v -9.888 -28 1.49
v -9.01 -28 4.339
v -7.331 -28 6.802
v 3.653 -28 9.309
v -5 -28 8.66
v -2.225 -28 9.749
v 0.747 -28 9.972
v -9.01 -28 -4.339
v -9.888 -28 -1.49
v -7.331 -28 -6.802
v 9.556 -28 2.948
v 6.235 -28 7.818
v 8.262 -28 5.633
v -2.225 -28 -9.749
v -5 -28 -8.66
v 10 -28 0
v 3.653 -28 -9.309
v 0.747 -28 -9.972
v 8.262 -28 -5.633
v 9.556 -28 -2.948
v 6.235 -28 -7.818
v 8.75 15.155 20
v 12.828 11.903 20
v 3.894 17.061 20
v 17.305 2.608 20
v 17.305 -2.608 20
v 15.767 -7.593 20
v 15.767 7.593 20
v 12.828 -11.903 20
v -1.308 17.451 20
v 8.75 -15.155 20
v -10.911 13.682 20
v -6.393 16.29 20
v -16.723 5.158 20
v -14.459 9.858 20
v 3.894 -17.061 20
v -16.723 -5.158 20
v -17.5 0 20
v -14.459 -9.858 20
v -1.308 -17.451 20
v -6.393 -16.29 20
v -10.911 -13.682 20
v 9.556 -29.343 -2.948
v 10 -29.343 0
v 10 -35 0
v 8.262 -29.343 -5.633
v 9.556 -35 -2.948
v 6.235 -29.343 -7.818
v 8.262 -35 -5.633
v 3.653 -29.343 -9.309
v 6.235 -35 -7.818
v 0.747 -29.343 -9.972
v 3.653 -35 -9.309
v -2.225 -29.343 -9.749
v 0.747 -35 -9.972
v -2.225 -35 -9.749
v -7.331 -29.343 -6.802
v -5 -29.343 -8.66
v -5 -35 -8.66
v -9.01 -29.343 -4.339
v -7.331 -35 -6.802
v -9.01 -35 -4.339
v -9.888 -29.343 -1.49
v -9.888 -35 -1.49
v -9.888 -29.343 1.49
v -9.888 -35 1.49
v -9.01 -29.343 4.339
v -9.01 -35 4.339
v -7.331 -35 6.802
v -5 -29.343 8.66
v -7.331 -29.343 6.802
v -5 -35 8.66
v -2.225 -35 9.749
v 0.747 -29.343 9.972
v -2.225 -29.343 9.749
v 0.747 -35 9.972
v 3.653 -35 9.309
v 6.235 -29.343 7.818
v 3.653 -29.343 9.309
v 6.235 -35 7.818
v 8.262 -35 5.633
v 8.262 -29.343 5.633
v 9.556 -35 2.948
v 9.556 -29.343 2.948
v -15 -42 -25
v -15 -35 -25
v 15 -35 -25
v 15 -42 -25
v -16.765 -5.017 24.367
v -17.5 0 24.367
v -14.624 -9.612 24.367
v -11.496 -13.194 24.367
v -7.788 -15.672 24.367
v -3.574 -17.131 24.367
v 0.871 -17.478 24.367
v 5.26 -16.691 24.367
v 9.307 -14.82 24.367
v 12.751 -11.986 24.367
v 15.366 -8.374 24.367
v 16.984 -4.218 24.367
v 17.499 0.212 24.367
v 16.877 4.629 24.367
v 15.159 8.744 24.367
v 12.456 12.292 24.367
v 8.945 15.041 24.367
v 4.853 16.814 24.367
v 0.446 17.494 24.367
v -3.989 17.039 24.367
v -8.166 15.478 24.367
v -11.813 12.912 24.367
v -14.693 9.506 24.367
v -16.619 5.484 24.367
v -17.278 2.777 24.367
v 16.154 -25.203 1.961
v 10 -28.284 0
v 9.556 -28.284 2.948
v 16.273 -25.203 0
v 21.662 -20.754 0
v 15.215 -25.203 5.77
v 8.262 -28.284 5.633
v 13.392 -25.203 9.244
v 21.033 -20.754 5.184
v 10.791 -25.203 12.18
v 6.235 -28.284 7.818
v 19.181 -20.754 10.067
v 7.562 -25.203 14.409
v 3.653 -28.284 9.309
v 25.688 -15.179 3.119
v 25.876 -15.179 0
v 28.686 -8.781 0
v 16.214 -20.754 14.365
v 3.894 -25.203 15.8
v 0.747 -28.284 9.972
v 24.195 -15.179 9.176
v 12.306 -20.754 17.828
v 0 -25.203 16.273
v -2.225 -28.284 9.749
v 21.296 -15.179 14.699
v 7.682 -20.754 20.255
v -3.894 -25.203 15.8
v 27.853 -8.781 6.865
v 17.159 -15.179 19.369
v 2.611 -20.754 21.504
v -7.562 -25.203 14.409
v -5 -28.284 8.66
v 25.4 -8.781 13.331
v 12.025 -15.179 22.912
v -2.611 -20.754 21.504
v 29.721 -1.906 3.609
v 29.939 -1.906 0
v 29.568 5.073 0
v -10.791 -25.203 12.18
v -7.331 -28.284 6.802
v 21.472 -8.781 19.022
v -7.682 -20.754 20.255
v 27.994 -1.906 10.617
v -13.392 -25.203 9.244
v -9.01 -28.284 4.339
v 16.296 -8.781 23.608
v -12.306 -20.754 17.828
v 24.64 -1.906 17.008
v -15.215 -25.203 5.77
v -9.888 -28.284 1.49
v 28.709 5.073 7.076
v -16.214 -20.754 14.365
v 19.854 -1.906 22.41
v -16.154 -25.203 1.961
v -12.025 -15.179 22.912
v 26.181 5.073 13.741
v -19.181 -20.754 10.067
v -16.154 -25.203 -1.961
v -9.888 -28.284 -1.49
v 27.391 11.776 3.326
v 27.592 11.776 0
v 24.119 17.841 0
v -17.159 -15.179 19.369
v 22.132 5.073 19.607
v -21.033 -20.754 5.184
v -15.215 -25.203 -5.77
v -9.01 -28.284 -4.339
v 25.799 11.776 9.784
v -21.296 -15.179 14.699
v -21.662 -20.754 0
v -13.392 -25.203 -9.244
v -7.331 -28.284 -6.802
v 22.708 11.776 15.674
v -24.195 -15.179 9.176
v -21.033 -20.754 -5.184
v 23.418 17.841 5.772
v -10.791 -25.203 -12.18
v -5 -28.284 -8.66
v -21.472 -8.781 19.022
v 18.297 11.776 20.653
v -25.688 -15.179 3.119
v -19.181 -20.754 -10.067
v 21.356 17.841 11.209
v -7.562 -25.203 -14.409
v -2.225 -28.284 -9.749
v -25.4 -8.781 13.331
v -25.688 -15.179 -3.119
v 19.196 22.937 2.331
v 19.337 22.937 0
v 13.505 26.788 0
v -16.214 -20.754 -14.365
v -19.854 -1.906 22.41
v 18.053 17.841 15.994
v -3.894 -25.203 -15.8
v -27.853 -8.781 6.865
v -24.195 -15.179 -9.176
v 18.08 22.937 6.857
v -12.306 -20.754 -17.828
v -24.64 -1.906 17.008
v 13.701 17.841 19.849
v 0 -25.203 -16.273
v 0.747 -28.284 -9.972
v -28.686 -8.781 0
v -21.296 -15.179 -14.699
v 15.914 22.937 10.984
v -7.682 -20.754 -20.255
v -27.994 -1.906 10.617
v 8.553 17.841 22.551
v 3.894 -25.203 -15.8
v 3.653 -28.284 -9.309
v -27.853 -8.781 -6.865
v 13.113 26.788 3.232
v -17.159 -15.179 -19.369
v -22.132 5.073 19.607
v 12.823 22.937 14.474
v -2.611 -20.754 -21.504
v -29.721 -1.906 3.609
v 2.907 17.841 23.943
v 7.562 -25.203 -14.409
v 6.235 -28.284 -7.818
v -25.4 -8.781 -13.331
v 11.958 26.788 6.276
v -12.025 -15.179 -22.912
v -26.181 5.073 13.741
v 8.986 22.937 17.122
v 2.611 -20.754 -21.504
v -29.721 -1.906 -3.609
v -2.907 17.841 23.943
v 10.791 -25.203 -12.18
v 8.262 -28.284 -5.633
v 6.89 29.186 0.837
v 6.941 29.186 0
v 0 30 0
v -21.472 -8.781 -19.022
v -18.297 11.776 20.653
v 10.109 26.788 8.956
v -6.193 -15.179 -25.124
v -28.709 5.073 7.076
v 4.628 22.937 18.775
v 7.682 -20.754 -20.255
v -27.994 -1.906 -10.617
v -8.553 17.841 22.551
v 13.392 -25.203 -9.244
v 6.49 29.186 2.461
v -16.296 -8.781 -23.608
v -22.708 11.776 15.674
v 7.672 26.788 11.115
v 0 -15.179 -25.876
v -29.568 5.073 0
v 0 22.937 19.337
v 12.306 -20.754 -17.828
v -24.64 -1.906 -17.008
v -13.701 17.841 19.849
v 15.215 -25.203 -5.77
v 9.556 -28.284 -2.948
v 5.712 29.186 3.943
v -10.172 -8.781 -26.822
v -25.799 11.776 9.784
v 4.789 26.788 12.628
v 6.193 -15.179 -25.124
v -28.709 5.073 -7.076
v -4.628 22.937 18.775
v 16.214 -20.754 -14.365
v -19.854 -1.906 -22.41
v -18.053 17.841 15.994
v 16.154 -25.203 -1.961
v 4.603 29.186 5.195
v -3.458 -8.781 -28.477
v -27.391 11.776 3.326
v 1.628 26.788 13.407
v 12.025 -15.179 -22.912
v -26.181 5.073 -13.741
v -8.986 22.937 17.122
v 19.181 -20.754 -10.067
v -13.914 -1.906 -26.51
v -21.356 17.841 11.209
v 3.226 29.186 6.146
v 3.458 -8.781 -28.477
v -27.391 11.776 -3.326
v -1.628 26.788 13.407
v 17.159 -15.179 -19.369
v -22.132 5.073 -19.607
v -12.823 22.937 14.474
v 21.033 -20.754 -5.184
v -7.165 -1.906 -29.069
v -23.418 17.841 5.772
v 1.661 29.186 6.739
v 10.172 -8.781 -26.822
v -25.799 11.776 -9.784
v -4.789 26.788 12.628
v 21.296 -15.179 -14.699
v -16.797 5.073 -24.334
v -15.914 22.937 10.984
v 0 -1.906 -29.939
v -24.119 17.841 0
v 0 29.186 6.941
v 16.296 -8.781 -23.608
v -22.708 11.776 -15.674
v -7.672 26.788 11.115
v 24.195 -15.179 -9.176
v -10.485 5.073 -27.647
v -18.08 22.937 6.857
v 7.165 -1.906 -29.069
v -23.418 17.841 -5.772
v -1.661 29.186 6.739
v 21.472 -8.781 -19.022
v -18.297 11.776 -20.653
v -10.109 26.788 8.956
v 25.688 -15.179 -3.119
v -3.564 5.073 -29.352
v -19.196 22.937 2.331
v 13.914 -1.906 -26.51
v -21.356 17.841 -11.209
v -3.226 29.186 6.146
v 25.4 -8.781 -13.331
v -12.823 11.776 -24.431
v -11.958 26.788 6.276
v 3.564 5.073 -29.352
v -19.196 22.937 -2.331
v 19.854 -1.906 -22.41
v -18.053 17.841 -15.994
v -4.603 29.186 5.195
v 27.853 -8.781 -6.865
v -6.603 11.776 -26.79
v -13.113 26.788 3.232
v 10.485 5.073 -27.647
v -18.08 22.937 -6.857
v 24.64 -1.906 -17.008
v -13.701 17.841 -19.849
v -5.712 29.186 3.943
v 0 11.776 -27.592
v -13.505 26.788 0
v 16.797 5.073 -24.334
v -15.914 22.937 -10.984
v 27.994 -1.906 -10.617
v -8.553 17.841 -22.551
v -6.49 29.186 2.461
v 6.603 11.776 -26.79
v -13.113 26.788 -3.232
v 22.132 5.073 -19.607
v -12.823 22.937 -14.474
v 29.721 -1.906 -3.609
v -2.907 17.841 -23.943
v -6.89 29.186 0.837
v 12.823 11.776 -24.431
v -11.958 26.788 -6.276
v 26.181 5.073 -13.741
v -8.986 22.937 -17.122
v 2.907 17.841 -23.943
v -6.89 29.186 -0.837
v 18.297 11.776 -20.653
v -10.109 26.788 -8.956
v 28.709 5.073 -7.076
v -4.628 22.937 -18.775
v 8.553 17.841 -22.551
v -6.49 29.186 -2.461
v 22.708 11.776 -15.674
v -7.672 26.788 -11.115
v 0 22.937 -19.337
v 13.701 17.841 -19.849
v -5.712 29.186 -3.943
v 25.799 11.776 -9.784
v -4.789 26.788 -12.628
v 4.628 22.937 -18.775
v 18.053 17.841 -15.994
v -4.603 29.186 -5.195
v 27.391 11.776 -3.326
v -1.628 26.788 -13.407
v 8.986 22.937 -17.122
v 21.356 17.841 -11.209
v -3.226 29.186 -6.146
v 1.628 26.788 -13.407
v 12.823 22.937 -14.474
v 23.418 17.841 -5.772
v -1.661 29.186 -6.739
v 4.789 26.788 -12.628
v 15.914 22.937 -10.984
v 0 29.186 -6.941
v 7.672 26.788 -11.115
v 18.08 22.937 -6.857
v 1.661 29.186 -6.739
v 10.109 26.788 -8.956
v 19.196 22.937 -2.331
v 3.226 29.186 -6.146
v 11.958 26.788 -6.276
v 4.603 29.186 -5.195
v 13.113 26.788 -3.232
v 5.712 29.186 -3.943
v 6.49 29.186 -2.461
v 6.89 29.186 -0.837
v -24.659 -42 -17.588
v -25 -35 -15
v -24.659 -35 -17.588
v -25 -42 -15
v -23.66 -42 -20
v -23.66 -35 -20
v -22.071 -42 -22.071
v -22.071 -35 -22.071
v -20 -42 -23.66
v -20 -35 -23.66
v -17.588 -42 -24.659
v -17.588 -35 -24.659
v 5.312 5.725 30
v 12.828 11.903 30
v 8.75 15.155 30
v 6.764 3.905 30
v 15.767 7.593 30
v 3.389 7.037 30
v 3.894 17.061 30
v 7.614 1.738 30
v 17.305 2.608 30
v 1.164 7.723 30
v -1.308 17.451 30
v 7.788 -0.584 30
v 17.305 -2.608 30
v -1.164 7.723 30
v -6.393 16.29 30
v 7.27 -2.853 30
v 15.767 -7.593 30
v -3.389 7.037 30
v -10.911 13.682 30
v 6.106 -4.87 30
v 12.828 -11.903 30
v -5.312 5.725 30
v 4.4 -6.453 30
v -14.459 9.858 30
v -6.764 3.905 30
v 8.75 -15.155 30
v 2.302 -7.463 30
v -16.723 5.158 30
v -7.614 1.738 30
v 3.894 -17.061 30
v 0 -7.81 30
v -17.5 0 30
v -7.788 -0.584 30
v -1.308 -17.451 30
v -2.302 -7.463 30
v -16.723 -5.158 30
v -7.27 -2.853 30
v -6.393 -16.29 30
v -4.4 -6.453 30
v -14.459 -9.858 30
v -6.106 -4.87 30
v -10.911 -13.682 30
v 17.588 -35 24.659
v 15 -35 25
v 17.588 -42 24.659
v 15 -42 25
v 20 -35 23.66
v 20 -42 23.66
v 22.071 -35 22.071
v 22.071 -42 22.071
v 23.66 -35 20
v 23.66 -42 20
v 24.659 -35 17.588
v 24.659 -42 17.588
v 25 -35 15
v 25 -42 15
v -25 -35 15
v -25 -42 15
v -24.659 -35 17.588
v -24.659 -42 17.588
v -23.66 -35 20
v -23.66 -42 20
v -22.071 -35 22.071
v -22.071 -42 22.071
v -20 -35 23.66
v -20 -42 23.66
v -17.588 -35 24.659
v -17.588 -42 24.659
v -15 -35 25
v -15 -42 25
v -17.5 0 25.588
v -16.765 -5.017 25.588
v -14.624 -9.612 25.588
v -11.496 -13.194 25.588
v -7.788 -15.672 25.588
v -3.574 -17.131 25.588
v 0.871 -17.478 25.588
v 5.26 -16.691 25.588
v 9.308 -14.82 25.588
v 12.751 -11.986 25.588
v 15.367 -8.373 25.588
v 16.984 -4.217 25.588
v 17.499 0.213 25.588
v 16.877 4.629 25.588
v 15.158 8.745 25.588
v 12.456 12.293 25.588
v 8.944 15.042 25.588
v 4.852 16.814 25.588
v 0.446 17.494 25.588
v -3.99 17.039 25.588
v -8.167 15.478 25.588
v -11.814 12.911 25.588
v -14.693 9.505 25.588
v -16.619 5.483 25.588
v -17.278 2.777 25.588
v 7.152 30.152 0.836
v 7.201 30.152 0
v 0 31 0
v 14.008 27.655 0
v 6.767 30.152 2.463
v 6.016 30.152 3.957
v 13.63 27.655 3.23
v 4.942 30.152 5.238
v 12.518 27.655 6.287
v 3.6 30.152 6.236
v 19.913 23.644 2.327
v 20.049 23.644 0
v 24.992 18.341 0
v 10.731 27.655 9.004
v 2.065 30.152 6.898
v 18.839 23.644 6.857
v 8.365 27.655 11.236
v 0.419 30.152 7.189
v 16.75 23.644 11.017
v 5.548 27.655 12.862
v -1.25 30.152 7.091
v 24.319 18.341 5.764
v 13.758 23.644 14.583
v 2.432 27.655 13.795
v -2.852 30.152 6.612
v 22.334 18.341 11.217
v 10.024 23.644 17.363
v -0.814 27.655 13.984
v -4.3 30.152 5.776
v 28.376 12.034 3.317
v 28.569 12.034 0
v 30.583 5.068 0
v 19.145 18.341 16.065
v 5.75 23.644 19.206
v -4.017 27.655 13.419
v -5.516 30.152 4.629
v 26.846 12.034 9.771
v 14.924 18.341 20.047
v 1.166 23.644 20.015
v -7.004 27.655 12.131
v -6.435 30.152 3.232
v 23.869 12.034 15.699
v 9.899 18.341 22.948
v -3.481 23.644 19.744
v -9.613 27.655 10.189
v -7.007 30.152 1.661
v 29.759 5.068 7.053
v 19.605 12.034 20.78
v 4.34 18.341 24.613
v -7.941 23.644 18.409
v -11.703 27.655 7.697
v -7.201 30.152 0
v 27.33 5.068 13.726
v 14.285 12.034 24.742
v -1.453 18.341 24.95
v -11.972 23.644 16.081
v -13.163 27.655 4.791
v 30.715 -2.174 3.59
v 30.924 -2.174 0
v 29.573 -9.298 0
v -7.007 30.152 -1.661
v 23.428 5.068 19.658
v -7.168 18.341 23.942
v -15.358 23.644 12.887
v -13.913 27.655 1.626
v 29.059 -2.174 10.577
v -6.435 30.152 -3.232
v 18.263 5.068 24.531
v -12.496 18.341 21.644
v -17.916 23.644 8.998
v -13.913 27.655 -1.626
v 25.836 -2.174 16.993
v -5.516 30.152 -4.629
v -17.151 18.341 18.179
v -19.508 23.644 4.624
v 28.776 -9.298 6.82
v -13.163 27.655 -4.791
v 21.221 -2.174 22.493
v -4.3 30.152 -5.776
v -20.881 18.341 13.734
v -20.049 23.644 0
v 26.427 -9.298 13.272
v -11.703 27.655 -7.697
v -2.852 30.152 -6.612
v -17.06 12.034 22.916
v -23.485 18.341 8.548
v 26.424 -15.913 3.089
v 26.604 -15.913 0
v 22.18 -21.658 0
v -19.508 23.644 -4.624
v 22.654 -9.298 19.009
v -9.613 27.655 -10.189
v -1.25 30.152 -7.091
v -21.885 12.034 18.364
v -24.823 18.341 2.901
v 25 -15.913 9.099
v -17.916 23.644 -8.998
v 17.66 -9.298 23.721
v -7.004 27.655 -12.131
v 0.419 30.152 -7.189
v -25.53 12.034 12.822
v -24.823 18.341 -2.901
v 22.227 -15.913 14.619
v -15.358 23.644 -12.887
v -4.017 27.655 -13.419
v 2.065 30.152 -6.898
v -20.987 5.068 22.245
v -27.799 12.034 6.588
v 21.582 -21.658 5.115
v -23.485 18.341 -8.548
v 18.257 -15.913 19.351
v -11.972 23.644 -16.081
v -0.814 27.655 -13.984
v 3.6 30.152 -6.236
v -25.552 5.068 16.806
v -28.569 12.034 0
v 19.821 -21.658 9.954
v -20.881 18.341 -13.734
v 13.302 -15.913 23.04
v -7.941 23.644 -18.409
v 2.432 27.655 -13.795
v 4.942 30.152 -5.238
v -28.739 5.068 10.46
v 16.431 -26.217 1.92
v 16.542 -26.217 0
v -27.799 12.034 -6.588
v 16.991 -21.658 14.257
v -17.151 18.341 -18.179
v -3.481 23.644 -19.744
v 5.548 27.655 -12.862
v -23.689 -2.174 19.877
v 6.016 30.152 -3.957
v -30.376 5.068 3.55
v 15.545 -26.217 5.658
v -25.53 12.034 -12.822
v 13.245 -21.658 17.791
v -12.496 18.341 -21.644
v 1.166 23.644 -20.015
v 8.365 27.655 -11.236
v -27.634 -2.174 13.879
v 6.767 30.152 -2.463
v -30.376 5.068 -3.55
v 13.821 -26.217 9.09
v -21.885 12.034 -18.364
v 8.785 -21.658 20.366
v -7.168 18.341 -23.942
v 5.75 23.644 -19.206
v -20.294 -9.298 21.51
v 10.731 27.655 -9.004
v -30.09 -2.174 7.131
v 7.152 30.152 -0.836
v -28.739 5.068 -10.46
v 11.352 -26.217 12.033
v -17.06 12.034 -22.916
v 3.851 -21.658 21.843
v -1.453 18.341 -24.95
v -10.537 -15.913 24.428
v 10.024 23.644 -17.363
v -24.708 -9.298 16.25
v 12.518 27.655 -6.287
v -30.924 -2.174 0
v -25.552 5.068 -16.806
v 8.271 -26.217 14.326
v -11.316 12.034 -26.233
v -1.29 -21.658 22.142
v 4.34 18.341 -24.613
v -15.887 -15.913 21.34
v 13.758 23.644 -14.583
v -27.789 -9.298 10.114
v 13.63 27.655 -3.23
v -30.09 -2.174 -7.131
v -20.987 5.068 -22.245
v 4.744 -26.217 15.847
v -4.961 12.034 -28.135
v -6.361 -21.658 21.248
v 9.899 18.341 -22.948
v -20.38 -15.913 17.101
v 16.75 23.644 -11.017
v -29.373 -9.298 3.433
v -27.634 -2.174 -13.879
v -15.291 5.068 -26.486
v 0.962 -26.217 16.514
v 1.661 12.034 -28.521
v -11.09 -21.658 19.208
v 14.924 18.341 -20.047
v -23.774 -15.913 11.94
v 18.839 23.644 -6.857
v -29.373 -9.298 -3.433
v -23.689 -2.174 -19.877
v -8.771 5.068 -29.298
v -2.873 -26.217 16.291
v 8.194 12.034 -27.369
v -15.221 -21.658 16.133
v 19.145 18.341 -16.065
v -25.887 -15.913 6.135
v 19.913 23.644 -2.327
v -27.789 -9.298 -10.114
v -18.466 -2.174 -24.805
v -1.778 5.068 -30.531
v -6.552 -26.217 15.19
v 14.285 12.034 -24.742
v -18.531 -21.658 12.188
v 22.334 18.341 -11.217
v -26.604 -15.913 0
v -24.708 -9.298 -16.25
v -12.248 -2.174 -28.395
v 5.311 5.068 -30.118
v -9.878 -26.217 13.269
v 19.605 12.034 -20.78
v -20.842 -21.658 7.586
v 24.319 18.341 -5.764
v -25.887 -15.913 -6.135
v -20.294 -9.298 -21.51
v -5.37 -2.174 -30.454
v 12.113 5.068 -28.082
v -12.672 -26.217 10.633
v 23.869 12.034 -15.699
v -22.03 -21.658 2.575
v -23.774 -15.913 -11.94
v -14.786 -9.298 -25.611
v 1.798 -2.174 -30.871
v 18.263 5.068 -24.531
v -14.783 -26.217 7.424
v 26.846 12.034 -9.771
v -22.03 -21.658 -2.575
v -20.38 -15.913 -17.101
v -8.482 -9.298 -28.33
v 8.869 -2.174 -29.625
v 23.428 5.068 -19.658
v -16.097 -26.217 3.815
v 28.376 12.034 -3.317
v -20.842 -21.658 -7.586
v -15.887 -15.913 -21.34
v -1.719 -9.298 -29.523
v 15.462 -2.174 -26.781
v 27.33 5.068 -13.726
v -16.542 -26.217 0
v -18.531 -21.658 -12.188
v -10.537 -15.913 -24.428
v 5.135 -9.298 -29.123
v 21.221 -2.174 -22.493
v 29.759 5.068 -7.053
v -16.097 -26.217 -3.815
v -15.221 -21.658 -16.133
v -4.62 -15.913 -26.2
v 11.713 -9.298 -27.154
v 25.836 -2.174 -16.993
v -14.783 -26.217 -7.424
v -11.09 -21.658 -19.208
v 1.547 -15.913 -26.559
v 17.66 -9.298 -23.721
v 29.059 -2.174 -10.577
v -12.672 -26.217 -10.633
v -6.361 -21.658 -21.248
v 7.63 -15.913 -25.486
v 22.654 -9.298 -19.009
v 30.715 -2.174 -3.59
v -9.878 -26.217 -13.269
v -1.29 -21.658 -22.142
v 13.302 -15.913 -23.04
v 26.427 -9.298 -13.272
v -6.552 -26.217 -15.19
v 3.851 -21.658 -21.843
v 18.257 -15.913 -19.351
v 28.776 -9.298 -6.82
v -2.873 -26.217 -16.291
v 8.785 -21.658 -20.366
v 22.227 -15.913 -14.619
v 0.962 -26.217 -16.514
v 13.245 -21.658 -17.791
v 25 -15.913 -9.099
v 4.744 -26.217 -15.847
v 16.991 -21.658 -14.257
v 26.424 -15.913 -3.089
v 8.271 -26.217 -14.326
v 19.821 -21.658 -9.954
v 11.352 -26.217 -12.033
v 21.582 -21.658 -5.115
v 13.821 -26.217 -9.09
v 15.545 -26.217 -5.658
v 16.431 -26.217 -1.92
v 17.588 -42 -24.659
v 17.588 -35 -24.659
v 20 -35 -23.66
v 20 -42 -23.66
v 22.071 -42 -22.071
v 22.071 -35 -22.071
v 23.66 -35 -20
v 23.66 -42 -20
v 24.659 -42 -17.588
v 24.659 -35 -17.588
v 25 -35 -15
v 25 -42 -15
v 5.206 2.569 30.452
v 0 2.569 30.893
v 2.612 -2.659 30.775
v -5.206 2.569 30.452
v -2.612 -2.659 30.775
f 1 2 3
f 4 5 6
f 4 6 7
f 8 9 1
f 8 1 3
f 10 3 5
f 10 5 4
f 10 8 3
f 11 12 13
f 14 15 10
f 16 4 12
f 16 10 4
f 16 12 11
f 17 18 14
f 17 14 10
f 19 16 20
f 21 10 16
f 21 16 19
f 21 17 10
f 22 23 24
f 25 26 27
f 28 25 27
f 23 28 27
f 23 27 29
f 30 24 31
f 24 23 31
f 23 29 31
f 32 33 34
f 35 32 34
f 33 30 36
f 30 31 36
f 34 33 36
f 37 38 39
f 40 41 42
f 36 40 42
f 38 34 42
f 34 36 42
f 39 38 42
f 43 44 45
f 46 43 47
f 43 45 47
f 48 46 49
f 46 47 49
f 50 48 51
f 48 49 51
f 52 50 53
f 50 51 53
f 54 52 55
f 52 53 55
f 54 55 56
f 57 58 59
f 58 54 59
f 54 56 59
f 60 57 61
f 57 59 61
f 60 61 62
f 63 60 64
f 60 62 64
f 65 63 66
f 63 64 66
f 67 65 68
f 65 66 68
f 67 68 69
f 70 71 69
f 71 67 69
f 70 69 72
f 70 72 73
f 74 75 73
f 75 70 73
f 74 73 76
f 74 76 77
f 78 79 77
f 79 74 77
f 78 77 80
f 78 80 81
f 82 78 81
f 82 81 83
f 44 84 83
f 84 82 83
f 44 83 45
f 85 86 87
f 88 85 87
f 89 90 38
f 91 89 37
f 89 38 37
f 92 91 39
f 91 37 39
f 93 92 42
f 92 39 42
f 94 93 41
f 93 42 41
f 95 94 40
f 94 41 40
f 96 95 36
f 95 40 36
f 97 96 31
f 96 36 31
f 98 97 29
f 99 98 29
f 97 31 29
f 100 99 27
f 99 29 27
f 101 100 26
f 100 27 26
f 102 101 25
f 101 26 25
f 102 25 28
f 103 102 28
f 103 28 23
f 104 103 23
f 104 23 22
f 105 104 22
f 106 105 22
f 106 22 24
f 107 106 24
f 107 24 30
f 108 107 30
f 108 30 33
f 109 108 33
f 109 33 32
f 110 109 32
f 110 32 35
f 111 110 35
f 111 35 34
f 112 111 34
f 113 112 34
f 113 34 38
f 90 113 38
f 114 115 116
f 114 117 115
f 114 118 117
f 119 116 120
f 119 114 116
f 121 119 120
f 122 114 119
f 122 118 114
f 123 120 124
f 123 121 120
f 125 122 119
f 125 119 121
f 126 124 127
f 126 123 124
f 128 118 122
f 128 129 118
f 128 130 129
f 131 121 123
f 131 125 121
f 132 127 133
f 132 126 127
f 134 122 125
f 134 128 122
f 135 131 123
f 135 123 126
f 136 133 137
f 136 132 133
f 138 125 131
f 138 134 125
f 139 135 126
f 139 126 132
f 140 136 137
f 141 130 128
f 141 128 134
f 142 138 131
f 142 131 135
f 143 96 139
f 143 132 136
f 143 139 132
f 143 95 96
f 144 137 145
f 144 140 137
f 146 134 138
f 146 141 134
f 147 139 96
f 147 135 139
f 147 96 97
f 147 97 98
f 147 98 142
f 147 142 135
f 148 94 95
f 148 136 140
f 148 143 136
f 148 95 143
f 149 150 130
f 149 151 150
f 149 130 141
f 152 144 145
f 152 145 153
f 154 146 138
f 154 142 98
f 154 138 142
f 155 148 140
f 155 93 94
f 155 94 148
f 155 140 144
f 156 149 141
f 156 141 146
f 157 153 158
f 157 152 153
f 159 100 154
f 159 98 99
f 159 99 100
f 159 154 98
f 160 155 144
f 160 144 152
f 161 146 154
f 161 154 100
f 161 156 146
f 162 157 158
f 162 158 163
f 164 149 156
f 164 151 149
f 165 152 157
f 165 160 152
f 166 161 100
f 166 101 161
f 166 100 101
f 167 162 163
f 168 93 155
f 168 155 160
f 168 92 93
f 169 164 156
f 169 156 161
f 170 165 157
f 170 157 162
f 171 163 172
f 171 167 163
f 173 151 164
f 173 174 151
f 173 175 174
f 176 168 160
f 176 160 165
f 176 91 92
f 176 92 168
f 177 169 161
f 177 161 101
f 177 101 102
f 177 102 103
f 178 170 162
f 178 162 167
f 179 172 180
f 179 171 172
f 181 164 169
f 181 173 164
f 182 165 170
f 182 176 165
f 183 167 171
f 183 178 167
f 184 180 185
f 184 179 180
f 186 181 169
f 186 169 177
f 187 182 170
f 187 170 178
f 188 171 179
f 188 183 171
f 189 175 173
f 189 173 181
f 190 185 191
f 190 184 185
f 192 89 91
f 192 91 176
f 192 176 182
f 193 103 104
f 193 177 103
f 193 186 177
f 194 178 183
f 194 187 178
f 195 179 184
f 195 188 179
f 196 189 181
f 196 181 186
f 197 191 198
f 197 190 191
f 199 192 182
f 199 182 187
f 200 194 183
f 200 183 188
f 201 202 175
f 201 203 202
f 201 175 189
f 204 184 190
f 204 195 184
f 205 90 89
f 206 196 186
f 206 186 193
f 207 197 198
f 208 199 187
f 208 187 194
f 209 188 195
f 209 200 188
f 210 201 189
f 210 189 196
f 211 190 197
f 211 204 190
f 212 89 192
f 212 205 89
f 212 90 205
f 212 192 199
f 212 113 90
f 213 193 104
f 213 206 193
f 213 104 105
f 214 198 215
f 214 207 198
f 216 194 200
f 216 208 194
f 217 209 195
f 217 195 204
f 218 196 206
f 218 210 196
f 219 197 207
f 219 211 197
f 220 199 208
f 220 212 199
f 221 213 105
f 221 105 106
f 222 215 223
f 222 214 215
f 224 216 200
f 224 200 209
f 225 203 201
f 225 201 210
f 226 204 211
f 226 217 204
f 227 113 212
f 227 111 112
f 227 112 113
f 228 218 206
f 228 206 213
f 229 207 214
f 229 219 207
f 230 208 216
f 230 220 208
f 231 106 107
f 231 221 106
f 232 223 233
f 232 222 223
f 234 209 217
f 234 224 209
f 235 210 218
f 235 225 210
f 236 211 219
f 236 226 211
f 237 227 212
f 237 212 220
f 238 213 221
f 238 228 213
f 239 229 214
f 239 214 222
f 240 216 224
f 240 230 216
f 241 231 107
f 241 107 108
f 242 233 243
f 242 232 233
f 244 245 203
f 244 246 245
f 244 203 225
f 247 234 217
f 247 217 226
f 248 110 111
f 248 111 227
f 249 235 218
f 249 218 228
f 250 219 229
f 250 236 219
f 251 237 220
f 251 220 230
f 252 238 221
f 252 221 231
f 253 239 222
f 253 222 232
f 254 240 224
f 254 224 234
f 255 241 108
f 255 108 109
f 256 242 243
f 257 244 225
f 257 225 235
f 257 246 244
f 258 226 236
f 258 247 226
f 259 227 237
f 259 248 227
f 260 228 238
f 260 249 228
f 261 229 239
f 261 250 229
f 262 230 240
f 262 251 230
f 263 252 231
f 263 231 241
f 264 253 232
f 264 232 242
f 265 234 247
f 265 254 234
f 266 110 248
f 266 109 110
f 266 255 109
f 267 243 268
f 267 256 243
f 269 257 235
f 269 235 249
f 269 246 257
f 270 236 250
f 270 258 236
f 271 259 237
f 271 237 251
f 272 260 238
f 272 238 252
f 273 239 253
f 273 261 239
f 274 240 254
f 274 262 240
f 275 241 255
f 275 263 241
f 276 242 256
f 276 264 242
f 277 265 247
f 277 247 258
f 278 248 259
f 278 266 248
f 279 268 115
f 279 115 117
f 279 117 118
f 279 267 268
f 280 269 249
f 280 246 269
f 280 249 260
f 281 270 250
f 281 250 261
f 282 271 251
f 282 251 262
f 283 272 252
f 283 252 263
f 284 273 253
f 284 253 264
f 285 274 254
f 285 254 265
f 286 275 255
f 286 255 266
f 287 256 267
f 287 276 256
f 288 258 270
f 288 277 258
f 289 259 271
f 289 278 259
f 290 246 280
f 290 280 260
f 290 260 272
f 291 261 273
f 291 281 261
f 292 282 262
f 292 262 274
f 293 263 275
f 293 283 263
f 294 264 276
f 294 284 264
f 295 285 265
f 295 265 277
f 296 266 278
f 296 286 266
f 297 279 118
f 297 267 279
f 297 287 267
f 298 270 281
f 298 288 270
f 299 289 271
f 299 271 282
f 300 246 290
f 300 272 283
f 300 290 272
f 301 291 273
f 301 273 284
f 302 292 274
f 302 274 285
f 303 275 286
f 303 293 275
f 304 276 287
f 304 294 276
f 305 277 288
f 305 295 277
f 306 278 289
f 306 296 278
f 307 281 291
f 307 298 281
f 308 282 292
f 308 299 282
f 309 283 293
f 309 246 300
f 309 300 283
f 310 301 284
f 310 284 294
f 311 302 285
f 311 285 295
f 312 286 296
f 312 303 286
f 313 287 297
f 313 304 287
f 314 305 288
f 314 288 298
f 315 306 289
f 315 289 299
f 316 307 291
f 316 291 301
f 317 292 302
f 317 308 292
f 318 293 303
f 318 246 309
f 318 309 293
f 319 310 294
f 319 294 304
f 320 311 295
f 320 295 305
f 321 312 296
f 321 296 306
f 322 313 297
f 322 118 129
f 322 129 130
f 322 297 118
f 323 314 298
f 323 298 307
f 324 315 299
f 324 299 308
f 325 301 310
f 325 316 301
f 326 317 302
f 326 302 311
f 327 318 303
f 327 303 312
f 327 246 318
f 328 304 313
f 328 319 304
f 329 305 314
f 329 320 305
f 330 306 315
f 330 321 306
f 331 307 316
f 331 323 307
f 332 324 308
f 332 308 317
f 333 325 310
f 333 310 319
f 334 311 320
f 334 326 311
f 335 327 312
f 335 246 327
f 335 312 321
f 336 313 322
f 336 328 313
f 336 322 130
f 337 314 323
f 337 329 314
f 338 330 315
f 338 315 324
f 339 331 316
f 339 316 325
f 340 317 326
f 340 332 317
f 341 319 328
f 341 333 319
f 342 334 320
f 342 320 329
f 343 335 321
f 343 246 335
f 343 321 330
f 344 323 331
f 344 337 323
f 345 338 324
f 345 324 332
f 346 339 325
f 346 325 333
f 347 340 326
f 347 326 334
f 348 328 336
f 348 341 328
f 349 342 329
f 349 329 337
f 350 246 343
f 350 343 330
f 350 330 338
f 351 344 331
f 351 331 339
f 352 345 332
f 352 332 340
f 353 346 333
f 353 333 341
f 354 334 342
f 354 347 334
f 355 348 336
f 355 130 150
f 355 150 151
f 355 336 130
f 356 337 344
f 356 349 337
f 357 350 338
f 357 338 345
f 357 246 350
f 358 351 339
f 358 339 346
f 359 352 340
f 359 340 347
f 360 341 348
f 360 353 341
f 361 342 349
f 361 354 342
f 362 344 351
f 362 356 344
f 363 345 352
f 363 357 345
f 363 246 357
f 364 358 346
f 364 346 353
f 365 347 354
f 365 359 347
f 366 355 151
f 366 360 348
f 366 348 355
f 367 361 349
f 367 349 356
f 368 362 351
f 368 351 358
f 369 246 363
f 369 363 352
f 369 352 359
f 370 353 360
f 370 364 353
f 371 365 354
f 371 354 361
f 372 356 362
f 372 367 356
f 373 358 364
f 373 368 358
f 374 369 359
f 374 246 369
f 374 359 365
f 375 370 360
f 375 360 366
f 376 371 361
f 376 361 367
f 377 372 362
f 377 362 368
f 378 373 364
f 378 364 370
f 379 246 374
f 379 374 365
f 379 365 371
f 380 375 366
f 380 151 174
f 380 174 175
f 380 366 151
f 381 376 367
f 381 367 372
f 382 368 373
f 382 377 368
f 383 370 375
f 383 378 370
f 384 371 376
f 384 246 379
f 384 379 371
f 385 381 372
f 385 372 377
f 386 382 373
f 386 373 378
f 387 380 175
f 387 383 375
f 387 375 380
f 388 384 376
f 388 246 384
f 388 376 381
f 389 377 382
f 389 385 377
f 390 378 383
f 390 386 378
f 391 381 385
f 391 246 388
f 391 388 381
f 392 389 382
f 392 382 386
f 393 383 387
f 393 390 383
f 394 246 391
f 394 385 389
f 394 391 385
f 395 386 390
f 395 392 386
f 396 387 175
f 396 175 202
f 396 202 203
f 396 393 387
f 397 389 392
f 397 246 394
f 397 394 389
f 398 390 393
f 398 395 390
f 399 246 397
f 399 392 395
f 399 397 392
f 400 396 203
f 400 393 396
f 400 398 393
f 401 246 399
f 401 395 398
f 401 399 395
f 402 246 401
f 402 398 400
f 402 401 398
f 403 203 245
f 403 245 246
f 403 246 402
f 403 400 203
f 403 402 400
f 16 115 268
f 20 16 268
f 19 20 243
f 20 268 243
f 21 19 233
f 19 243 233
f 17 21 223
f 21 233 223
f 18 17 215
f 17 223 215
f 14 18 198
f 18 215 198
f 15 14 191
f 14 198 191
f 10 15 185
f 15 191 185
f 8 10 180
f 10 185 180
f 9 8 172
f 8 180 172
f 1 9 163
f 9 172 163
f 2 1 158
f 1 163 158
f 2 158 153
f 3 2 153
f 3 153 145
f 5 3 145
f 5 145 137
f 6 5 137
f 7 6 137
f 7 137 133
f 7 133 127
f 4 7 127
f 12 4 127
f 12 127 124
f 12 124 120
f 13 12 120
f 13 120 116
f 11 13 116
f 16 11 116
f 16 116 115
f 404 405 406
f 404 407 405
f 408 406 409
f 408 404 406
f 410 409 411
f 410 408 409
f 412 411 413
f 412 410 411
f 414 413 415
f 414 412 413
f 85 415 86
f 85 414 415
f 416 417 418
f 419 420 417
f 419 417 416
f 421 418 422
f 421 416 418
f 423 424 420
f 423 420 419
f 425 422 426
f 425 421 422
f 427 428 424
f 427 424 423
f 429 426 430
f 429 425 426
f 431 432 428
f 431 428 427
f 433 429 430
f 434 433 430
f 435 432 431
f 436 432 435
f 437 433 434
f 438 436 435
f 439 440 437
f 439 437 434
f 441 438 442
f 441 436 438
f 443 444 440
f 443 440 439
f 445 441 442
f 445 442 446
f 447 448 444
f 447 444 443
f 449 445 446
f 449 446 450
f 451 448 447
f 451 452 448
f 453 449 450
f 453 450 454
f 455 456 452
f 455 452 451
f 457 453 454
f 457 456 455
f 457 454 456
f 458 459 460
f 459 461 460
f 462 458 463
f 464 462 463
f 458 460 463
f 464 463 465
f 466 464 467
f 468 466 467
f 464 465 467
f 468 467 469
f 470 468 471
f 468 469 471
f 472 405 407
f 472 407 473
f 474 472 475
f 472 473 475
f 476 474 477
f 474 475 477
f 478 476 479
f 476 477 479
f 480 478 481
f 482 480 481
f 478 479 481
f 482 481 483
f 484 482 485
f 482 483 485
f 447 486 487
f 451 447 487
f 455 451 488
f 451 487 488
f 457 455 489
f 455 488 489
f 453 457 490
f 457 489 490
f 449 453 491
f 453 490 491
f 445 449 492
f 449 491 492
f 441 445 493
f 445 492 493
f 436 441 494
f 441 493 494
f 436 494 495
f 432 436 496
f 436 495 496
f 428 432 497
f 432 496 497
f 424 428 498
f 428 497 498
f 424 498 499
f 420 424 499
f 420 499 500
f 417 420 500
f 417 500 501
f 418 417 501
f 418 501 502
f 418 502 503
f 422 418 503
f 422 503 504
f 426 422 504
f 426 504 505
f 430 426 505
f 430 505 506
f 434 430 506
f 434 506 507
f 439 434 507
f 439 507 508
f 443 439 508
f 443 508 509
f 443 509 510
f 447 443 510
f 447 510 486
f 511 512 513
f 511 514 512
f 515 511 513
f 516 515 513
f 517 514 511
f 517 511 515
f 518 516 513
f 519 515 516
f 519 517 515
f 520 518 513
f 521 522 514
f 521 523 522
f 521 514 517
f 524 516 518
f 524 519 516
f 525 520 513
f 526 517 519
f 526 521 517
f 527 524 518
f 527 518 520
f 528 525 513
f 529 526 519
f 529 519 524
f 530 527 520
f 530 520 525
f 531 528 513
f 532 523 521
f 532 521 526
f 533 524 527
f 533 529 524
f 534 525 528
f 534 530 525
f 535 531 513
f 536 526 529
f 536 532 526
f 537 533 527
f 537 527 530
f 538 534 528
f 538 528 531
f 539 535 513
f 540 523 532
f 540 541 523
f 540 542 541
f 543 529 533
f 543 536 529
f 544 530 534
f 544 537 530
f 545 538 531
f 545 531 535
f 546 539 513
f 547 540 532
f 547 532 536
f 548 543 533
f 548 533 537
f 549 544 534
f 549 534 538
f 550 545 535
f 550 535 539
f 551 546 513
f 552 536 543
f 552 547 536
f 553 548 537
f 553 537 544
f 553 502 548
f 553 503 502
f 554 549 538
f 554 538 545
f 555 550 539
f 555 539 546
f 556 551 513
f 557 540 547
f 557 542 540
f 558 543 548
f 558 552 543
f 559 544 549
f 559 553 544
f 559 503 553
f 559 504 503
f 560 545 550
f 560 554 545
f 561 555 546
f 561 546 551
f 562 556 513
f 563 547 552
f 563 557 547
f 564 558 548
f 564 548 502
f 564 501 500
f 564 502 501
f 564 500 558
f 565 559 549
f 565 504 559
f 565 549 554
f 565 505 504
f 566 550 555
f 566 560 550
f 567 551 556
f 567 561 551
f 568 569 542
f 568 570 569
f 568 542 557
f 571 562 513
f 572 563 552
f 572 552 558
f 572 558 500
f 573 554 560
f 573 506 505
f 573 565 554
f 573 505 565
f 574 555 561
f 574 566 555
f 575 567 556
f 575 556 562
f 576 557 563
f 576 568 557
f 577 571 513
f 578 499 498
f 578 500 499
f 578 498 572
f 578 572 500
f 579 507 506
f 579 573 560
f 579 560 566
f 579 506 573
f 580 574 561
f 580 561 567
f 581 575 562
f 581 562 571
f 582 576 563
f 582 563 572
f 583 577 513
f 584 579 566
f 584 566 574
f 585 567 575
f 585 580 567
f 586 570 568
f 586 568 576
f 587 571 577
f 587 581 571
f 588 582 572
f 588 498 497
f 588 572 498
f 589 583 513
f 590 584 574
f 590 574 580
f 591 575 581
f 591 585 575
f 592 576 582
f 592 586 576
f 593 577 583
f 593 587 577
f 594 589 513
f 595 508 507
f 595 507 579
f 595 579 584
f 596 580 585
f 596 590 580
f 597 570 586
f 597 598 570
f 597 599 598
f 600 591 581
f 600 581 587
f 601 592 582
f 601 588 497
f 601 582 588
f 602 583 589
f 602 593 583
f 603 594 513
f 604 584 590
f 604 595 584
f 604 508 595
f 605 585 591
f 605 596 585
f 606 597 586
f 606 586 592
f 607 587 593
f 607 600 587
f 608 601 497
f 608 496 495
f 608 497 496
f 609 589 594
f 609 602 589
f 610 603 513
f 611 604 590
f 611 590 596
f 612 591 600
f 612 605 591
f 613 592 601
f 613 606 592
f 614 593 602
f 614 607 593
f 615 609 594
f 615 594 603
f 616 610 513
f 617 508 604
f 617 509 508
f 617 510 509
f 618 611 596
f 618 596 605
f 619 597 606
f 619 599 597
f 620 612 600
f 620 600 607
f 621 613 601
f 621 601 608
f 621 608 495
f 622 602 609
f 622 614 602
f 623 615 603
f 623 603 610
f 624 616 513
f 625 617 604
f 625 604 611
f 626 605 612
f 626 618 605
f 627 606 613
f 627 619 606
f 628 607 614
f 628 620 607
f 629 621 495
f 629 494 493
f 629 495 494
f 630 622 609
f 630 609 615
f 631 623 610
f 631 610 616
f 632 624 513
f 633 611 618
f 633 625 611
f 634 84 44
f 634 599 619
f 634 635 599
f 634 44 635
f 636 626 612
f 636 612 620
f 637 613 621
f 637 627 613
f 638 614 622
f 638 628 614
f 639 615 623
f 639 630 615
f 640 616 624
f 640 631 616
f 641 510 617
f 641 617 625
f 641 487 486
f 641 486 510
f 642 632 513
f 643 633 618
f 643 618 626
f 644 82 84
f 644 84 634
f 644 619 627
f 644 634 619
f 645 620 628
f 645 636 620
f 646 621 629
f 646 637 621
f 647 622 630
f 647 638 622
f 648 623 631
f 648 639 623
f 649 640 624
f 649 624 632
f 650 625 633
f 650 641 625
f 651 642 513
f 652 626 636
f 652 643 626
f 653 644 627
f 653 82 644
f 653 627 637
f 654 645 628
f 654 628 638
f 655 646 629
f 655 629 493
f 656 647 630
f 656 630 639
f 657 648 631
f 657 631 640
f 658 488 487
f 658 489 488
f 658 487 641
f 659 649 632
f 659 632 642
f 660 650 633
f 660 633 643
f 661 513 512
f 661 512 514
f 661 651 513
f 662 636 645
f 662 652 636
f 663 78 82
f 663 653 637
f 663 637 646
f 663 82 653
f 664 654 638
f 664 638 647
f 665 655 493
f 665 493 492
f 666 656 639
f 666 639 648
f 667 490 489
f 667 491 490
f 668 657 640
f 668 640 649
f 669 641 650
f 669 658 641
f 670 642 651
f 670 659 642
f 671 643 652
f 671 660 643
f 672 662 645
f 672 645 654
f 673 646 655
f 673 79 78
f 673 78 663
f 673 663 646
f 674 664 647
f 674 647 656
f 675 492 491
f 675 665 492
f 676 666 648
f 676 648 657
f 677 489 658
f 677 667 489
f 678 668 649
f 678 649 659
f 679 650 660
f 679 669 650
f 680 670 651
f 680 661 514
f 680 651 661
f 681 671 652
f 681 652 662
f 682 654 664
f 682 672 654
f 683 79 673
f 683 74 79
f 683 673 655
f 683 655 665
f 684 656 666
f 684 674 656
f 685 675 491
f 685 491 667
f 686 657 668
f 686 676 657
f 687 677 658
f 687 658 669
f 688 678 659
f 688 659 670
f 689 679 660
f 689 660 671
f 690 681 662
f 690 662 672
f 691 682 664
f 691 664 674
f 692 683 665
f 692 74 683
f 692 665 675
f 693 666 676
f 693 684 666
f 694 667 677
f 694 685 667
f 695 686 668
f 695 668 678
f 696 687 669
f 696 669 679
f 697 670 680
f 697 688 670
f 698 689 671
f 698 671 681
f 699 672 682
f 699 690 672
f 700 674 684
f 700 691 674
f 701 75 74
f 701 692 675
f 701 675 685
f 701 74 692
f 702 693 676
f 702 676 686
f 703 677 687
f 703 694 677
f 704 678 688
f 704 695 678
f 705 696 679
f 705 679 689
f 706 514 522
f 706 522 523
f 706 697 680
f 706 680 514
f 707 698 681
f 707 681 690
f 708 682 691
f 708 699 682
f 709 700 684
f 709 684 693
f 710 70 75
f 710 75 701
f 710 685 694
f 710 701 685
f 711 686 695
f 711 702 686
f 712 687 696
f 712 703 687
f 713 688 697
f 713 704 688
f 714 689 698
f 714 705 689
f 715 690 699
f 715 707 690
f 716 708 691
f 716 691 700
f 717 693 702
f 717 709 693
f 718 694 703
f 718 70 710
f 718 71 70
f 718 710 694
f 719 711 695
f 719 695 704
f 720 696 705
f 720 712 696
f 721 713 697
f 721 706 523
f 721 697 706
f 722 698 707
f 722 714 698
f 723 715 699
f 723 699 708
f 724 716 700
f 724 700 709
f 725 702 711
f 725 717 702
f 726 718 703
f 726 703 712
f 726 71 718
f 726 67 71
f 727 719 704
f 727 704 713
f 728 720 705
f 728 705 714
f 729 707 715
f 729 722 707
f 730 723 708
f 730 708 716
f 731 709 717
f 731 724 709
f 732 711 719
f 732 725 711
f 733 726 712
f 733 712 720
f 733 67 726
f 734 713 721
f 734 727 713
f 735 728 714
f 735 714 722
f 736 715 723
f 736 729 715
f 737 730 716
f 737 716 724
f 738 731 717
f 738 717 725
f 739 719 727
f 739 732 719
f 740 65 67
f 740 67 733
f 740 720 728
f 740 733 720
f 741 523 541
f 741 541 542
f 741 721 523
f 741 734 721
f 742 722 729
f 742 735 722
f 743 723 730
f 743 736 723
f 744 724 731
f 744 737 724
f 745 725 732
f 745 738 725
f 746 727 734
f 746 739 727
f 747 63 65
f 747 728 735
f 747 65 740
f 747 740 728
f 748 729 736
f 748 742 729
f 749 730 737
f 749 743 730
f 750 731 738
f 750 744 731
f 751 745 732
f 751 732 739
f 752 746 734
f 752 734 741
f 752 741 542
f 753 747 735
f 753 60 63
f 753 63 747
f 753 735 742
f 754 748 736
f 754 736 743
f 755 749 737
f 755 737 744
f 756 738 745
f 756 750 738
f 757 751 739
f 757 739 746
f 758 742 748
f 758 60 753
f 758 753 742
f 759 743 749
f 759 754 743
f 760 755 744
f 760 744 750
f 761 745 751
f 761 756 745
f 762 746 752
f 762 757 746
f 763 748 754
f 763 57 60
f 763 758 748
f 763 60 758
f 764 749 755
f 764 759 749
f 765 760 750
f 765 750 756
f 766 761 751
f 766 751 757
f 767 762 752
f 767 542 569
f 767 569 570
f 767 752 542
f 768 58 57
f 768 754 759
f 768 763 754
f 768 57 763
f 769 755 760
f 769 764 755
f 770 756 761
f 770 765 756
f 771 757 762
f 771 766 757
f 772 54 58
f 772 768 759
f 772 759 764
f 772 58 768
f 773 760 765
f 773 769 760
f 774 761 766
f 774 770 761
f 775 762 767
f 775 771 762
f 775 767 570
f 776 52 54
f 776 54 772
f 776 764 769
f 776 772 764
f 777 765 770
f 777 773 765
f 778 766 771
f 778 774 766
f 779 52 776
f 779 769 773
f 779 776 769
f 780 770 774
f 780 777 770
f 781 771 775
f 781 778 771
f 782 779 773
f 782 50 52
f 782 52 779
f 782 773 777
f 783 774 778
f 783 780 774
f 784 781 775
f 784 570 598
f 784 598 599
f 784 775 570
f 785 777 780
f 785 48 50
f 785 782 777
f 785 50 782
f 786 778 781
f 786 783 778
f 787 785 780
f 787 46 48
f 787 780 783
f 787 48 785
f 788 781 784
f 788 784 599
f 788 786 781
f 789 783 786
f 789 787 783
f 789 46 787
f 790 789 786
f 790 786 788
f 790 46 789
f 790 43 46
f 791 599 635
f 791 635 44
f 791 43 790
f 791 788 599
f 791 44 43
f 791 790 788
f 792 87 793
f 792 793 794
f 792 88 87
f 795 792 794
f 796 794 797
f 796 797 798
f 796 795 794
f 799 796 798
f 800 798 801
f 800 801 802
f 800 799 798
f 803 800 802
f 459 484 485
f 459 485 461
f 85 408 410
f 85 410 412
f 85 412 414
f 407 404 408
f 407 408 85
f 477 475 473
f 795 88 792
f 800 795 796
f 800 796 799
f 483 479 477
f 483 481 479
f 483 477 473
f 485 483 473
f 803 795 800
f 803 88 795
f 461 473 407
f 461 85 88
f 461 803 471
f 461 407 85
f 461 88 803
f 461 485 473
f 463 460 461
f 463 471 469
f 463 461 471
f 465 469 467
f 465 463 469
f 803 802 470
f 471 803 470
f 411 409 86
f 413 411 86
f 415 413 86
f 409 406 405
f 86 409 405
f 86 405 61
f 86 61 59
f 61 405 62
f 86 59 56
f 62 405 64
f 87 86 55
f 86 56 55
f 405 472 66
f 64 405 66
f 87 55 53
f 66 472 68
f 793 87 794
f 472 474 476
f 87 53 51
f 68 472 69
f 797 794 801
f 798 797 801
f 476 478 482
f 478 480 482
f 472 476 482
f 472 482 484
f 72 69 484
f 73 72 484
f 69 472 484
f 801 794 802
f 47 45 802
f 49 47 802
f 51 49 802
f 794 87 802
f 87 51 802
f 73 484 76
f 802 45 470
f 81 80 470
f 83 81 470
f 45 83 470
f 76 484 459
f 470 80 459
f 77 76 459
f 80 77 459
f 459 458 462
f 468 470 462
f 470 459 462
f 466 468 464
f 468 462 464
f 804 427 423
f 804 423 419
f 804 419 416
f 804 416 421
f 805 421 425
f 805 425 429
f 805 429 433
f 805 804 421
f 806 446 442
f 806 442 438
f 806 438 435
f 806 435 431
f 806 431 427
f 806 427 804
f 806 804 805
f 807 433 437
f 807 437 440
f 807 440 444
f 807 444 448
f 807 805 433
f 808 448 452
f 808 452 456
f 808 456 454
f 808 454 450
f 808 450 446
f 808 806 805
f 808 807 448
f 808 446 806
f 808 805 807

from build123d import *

# Parameters (mm, degrees)
ESQUISSE3_R          = 17.5
EXTRUSION1_DEPTH     = 10
EXTRUSION3_START     = -35
EXTRUSION3_OUTLINE_R = 10
EXTRUSION3_DEPTH     = 7
ESQUISSE7_W          = 50
ESQUISSE7_H          = 50
EXTRUSION4_DEPTH     = 7
CONG_1_R             = 10


# Read off the part's stored shape, not the designer's step: Extrusion3
with BuildPart() as part:
    # Esquisse1 → Révol.-Mince1 (revolve)
    with BuildSketch(Plane.XY):
        with BuildLine():
            ThreePointArc((0, -30), (30, 0), (0, 30))
            Line((0, 30), (0, 31))
            ThreePointArc((0, 31), (31, 0), (0, -31))
            Line((0, -31), (0, -30))
        make_face()
    revolve(axis=Axis((0, 52.542035398, 0), (0, -1, 0)))

    # Esquisse3 → Extrusion1 (add)
    with BuildSketch(Plane.XY.offset(20)):
        with Locations(Location((0, 0, 0), (0, 0, 180))):
            Circle(ESQUISSE3_R)
    extrude(amount=EXTRUSION1_DEPTH)

    # Extrusion3 outline → Extrusion3 (add)
    with BuildSketch(Plane(origin=(0, 0, 0), x_dir=(1, 0, 0), z_dir=(0, 1, 0)).offset(EXTRUSION3_START)):
        Circle(EXTRUSION3_OUTLINE_R)
    extrude(amount=EXTRUSION3_DEPTH)

    # Esquisse7 → Extrusion4 (add)
    with BuildSketch(Plane.XZ.offset(35)):
        Rectangle(ESQUISSE7_W, ESQUISSE7_H)
    extrude(amount=EXTRUSION4_DEPTH)

    # Congé1
    cong_1_edges = [part.edges().sort_by_distance(p)[0] for p in [
        (25, -38.5, -25),
        (25, -38.5, 25),
        (-25, -38.5, 25),
        (-25, -38.5, -25),
    ]]
    fillet(cong_1_edges, radius=CONG_1_R)


solid = part.part
